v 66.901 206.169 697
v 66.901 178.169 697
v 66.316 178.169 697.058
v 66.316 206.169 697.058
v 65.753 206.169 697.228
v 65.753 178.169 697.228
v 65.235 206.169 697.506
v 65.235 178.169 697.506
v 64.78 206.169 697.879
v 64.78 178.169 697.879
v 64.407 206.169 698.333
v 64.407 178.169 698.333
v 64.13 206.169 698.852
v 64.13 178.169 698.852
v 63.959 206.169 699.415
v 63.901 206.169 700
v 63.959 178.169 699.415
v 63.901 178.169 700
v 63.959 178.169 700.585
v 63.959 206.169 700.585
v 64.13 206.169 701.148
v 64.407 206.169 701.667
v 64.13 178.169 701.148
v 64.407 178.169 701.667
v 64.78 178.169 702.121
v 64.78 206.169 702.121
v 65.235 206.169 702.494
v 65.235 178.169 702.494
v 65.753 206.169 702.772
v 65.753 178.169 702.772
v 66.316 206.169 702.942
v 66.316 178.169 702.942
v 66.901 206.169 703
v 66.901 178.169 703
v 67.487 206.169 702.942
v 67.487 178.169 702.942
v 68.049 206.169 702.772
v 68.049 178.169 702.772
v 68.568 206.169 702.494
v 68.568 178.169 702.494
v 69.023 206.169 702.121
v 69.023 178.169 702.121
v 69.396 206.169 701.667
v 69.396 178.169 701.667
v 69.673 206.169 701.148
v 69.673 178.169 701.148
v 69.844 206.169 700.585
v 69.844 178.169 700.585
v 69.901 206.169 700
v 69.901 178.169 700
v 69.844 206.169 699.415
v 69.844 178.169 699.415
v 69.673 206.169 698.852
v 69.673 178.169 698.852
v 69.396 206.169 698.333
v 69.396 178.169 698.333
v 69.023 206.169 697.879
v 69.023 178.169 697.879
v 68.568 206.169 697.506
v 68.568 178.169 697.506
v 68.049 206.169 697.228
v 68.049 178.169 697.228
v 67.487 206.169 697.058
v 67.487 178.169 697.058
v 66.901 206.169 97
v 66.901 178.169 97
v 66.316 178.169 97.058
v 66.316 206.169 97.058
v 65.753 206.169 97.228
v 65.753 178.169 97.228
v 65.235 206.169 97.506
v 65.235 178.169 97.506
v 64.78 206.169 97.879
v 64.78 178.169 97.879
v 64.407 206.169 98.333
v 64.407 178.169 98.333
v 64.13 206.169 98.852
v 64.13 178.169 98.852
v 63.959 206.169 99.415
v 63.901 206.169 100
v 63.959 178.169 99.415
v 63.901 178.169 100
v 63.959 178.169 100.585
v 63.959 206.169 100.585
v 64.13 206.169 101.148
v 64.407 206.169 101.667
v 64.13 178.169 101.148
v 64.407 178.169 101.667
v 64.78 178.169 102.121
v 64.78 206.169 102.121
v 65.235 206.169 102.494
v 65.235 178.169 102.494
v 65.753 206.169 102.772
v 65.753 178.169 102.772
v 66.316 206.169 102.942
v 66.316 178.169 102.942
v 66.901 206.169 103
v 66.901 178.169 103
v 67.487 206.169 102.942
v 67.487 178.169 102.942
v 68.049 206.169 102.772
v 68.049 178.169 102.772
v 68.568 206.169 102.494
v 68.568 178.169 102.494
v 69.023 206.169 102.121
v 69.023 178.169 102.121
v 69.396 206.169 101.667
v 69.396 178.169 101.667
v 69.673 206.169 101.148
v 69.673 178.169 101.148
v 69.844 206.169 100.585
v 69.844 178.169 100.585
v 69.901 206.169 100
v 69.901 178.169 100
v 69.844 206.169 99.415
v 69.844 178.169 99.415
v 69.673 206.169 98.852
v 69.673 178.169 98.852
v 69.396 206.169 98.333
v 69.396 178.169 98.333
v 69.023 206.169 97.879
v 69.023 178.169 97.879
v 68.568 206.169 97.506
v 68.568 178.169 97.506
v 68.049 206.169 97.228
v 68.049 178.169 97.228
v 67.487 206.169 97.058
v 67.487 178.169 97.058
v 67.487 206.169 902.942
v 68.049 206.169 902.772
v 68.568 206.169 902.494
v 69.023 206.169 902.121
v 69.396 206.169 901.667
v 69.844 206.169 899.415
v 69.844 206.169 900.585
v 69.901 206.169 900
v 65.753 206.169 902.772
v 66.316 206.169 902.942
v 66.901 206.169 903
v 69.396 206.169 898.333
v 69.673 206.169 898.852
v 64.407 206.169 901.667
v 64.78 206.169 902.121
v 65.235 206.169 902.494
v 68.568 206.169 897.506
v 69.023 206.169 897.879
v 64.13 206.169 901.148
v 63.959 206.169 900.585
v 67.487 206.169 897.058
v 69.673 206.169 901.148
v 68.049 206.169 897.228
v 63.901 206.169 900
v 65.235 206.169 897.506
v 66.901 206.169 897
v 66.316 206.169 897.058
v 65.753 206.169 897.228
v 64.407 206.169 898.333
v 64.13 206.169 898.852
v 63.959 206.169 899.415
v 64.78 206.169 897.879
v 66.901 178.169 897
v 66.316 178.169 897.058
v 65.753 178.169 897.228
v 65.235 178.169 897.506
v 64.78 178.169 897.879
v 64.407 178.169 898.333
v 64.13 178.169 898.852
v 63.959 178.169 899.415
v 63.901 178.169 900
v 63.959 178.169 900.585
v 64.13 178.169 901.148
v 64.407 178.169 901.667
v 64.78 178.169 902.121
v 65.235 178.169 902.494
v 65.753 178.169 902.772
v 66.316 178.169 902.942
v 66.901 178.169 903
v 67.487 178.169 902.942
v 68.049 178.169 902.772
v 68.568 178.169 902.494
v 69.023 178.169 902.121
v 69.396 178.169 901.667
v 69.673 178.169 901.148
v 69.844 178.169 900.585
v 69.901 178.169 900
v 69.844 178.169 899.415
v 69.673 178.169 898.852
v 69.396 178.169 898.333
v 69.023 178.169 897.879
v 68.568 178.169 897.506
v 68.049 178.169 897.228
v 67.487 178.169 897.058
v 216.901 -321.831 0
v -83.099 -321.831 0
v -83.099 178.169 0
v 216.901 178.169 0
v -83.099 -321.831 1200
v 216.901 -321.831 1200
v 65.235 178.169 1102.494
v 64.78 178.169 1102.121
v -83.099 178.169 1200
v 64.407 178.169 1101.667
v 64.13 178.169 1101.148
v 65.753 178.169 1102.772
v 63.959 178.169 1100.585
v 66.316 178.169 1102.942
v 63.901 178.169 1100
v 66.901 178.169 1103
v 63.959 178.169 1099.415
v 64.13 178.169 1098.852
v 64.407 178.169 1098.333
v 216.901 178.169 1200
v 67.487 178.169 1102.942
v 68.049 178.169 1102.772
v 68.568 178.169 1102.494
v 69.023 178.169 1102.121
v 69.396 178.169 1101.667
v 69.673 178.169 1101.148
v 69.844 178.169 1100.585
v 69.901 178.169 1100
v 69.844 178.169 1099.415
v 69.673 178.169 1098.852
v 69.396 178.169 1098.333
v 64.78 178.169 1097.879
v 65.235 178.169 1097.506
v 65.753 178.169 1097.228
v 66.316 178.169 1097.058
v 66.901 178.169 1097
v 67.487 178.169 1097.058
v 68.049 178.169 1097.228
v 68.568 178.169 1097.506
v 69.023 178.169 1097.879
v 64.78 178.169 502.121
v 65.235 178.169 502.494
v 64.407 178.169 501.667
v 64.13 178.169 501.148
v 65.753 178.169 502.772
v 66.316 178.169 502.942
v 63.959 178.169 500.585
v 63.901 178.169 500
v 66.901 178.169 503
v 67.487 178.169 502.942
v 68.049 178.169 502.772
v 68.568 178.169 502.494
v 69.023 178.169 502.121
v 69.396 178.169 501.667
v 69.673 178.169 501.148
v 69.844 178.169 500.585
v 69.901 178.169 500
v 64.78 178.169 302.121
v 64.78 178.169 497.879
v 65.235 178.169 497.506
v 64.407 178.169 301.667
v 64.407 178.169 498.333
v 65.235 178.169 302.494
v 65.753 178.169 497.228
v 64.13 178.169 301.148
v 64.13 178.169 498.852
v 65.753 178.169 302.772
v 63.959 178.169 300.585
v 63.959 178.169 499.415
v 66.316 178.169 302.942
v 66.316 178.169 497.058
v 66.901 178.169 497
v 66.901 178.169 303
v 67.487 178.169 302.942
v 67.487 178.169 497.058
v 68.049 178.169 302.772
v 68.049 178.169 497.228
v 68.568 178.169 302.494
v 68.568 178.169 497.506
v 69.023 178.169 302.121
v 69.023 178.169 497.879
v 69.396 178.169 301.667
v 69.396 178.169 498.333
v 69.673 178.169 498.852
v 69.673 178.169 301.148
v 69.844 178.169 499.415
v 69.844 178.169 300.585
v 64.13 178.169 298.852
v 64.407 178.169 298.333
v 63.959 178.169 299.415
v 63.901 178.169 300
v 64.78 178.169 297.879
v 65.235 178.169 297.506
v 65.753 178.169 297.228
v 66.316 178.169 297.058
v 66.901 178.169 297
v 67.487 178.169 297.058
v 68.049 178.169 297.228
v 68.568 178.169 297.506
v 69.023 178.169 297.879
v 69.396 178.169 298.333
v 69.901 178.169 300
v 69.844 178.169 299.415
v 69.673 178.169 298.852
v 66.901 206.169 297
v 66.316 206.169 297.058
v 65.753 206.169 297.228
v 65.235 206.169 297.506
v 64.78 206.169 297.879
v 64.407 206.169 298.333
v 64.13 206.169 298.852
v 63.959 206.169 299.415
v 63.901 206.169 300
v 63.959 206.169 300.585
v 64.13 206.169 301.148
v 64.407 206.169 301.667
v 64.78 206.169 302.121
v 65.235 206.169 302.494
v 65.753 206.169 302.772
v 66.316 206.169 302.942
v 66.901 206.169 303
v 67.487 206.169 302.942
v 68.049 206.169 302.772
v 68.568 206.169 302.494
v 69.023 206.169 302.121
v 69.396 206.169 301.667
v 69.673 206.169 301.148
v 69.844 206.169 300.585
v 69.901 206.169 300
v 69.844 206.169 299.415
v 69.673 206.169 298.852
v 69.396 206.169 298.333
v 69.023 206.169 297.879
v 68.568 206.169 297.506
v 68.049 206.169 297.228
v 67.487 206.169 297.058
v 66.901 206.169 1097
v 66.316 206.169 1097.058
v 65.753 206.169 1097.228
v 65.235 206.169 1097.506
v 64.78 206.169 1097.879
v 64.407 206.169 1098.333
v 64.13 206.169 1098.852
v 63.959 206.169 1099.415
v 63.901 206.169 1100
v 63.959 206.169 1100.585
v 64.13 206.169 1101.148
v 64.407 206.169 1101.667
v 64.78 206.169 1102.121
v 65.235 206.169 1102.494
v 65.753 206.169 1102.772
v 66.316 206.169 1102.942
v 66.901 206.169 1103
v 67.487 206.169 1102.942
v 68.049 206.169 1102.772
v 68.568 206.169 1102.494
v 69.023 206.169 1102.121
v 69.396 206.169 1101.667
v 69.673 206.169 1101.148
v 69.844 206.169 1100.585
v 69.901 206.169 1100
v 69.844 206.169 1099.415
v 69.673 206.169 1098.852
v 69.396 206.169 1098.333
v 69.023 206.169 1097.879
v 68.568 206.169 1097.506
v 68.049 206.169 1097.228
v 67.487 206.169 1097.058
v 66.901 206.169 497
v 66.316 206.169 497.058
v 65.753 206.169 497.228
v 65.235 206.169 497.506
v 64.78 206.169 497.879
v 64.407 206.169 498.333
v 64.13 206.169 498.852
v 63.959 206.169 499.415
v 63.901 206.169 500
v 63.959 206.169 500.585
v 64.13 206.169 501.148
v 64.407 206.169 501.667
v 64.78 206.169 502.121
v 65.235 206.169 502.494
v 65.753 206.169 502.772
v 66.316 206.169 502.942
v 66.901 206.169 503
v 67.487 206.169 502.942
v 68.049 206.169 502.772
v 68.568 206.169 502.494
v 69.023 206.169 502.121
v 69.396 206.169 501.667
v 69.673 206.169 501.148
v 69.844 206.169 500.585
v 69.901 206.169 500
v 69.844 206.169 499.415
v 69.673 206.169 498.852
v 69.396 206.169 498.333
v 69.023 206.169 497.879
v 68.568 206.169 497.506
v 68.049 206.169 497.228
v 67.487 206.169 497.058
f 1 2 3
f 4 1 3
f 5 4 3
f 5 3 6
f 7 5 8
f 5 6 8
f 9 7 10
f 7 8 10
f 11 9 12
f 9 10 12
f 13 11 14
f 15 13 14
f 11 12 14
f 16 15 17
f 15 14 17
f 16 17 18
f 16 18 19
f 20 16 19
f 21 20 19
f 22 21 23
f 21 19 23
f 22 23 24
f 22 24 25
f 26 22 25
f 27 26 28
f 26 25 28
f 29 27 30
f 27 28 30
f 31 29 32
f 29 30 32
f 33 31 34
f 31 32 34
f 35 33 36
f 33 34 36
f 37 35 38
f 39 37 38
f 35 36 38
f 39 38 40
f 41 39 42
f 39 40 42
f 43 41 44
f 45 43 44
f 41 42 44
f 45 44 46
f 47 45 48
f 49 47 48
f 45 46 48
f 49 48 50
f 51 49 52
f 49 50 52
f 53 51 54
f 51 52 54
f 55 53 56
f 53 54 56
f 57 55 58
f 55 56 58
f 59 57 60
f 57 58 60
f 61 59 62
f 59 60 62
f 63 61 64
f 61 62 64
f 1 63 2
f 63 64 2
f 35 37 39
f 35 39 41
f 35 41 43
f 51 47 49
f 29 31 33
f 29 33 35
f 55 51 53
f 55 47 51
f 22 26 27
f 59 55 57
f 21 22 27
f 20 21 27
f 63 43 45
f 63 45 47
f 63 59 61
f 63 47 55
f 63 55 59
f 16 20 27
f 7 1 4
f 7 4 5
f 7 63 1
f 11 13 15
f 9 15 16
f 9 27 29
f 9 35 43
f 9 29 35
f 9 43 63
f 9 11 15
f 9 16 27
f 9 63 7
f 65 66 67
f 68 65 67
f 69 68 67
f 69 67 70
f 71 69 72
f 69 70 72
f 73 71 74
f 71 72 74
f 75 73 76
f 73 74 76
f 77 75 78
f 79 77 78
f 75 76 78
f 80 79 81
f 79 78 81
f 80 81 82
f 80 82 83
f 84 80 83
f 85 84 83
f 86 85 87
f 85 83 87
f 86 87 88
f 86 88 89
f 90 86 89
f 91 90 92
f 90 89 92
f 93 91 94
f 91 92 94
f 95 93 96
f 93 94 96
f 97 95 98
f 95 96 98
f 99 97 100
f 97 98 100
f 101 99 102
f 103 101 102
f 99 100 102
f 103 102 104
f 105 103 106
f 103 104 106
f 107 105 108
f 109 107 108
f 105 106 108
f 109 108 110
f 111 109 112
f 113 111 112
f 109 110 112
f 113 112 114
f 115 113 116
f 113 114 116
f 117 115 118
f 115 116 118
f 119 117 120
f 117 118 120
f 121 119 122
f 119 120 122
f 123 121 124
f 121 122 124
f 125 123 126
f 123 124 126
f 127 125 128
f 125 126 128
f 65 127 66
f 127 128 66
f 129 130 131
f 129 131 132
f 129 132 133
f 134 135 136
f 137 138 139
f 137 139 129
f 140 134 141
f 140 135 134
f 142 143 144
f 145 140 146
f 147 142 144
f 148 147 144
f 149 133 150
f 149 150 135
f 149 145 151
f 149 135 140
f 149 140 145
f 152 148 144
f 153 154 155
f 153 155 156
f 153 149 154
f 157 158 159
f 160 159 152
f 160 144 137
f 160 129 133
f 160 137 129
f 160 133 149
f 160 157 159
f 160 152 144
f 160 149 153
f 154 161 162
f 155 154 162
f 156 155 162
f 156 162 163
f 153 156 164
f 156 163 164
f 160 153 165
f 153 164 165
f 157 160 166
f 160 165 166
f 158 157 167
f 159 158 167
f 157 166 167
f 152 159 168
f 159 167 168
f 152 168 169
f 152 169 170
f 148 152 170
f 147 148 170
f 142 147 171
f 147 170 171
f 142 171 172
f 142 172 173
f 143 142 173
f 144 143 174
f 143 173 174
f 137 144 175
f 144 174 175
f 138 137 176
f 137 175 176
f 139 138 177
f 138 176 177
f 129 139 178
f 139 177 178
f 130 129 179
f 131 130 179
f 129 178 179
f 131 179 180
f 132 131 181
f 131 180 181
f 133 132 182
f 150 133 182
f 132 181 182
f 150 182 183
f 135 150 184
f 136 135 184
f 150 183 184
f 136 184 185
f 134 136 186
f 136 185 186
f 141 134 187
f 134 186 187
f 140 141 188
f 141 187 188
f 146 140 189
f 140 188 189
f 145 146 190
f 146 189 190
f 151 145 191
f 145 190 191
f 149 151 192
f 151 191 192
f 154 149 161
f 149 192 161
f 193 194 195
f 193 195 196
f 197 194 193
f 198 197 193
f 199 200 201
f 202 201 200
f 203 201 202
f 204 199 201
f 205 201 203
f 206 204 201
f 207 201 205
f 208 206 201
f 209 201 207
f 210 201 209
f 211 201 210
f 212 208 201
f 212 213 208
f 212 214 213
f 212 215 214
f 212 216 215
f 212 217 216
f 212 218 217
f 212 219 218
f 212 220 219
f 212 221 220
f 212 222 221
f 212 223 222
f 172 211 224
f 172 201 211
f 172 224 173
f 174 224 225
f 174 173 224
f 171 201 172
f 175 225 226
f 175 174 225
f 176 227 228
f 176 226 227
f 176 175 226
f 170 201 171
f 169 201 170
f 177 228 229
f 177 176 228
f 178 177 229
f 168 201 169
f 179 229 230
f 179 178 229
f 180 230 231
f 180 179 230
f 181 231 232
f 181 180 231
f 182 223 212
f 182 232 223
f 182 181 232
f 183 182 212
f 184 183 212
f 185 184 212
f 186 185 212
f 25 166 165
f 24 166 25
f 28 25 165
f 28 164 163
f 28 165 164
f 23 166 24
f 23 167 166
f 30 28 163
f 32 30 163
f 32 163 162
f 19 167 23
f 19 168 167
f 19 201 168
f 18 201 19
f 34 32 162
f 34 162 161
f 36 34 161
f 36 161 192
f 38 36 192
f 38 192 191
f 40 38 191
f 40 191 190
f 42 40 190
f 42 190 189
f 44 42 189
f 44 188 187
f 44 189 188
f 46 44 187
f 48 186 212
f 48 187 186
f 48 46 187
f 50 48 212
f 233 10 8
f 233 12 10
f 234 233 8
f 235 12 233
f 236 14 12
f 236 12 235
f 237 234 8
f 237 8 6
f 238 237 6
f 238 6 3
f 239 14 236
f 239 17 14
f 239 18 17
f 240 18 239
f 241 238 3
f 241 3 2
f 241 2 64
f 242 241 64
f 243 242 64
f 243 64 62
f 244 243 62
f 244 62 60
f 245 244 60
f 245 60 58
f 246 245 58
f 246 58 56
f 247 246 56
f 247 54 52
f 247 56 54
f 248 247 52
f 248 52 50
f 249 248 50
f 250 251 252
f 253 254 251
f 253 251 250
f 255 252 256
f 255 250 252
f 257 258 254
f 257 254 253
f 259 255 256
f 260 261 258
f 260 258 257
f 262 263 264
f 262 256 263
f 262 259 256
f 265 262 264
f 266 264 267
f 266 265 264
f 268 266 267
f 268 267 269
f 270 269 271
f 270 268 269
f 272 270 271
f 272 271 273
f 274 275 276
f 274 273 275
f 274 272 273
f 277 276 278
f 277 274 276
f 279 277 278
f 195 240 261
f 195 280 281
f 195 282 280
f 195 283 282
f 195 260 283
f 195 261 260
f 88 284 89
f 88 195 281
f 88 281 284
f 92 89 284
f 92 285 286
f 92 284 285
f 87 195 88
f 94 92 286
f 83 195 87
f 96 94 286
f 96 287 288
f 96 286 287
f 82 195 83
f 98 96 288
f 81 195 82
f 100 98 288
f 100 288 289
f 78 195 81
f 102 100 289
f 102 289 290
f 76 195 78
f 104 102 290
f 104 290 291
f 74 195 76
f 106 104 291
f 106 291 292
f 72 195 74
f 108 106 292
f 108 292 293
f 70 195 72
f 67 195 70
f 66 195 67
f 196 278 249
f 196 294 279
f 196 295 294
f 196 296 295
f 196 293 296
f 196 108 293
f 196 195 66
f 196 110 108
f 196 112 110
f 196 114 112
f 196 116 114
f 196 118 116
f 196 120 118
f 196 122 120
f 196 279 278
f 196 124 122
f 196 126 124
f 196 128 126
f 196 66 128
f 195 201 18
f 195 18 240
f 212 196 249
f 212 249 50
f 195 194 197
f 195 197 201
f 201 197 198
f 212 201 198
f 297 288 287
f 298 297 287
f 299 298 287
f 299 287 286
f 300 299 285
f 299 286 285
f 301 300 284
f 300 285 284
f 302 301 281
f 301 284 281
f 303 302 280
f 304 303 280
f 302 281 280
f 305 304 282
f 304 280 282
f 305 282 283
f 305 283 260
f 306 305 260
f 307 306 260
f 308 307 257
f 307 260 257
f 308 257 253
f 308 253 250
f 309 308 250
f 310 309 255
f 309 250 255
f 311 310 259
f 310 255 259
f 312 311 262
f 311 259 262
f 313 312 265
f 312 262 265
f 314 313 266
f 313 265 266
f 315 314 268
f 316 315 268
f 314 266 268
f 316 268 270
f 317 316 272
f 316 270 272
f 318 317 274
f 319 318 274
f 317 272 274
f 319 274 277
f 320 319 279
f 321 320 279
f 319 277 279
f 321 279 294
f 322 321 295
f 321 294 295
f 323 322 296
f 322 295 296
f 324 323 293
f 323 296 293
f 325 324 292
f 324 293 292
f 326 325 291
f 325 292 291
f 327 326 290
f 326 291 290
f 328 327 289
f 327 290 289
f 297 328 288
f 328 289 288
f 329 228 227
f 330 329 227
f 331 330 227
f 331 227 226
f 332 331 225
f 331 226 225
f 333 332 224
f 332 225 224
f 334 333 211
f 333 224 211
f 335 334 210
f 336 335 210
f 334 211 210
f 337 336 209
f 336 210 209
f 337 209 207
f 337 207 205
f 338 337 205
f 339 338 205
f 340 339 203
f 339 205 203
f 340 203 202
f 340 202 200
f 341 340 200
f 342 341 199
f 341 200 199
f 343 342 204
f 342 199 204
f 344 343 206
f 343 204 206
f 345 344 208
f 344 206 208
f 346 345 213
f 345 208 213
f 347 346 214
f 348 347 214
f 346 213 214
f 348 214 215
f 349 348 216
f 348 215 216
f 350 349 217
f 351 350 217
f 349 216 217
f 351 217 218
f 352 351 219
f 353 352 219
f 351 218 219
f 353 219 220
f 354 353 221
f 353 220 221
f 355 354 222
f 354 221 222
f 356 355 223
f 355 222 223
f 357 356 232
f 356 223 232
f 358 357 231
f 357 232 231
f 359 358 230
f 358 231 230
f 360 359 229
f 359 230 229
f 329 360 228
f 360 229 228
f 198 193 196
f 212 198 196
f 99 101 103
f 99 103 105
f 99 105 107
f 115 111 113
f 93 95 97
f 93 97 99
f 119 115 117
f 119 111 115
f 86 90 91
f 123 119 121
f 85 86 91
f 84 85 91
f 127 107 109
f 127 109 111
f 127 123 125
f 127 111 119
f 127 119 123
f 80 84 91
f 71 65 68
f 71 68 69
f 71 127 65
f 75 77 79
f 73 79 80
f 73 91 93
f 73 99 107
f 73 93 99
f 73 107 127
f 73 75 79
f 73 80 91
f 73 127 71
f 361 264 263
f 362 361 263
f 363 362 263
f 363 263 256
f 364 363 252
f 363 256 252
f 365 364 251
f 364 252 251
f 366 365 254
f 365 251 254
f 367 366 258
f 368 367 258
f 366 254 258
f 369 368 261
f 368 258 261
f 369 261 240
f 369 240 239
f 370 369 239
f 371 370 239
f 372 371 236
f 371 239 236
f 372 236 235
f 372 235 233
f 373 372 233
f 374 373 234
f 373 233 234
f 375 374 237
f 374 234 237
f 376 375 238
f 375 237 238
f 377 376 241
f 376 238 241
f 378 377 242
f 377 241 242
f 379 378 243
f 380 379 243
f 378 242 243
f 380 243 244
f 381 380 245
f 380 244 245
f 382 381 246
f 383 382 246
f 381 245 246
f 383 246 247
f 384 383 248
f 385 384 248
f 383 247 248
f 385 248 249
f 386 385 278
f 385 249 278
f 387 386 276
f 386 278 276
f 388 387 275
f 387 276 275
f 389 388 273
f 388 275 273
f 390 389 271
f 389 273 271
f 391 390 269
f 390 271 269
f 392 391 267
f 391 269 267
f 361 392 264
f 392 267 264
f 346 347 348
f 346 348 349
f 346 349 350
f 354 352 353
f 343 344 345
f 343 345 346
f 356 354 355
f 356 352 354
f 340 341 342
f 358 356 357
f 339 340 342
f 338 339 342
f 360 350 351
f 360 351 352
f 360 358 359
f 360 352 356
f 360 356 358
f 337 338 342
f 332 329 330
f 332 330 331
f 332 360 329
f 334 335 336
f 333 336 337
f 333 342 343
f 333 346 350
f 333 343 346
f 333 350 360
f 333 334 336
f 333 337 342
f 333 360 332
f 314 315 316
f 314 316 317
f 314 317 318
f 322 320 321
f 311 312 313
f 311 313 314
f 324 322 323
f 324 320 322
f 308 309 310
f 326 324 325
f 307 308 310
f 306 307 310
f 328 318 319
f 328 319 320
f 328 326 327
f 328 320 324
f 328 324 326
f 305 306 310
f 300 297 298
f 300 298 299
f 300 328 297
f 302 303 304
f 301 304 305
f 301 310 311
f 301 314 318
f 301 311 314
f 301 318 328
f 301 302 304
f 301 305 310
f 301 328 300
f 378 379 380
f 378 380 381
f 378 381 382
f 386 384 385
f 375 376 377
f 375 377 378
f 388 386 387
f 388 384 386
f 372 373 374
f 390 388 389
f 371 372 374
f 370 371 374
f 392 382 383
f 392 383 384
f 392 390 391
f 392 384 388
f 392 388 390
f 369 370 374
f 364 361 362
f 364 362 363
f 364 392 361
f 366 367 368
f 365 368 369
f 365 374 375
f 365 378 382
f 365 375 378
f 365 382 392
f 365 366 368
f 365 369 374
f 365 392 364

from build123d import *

# Parameters (mm, degrees)
SKETCH1_W           = 300
SKETCH1_H           = 500
BOSS_EXTRUDE1_DEPTH = 1200
SKETCH2_R           = 3
BOSS_EXTRUDE2_DEPTH = 28


with BuildPart() as part:
    # Sketch1 → Boss-Extrude1 (new body)
    with BuildSketch(Plane.XY):
        with Locations((66.901408451, -71.830985915)):
            Rectangle(SKETCH1_W, SKETCH1_H)
    extrude(amount=BOSS_EXTRUDE1_DEPTH)

    # Sketch2 → Boss-Extrude2 (add)
    with BuildSketch(Plane(origin=(0, 178.169014085, 0), x_dir=(1, 0, 0), z_dir=(0, 1, 0))):
        with Locations(Location((66.901408451, -100, 0), (0, 0, 90))):
            Circle(SKETCH2_R)
        with Locations(Location((66.901408451, -300, 0), (0, 0, 90))):
            Circle(SKETCH2_R)
        with Locations(Location((66.901408451, -500, 0), (0, 0, 90))):
            Circle(SKETCH2_R)
        with Locations(Location((66.901408451, -700, 0), (0, 0, 90))):
            Circle(SKETCH2_R)
        with Locations(Location((66.901408451, -900, 0), (0, 0, 90))):
            Circle(SKETCH2_R)
        with Locations(Location((66.901408451, -1100, 0), (0, 0, 90))):
            Circle(SKETCH2_R)
    extrude(amount=BOSS_EXTRUDE2_DEPTH)


solid = part.part
